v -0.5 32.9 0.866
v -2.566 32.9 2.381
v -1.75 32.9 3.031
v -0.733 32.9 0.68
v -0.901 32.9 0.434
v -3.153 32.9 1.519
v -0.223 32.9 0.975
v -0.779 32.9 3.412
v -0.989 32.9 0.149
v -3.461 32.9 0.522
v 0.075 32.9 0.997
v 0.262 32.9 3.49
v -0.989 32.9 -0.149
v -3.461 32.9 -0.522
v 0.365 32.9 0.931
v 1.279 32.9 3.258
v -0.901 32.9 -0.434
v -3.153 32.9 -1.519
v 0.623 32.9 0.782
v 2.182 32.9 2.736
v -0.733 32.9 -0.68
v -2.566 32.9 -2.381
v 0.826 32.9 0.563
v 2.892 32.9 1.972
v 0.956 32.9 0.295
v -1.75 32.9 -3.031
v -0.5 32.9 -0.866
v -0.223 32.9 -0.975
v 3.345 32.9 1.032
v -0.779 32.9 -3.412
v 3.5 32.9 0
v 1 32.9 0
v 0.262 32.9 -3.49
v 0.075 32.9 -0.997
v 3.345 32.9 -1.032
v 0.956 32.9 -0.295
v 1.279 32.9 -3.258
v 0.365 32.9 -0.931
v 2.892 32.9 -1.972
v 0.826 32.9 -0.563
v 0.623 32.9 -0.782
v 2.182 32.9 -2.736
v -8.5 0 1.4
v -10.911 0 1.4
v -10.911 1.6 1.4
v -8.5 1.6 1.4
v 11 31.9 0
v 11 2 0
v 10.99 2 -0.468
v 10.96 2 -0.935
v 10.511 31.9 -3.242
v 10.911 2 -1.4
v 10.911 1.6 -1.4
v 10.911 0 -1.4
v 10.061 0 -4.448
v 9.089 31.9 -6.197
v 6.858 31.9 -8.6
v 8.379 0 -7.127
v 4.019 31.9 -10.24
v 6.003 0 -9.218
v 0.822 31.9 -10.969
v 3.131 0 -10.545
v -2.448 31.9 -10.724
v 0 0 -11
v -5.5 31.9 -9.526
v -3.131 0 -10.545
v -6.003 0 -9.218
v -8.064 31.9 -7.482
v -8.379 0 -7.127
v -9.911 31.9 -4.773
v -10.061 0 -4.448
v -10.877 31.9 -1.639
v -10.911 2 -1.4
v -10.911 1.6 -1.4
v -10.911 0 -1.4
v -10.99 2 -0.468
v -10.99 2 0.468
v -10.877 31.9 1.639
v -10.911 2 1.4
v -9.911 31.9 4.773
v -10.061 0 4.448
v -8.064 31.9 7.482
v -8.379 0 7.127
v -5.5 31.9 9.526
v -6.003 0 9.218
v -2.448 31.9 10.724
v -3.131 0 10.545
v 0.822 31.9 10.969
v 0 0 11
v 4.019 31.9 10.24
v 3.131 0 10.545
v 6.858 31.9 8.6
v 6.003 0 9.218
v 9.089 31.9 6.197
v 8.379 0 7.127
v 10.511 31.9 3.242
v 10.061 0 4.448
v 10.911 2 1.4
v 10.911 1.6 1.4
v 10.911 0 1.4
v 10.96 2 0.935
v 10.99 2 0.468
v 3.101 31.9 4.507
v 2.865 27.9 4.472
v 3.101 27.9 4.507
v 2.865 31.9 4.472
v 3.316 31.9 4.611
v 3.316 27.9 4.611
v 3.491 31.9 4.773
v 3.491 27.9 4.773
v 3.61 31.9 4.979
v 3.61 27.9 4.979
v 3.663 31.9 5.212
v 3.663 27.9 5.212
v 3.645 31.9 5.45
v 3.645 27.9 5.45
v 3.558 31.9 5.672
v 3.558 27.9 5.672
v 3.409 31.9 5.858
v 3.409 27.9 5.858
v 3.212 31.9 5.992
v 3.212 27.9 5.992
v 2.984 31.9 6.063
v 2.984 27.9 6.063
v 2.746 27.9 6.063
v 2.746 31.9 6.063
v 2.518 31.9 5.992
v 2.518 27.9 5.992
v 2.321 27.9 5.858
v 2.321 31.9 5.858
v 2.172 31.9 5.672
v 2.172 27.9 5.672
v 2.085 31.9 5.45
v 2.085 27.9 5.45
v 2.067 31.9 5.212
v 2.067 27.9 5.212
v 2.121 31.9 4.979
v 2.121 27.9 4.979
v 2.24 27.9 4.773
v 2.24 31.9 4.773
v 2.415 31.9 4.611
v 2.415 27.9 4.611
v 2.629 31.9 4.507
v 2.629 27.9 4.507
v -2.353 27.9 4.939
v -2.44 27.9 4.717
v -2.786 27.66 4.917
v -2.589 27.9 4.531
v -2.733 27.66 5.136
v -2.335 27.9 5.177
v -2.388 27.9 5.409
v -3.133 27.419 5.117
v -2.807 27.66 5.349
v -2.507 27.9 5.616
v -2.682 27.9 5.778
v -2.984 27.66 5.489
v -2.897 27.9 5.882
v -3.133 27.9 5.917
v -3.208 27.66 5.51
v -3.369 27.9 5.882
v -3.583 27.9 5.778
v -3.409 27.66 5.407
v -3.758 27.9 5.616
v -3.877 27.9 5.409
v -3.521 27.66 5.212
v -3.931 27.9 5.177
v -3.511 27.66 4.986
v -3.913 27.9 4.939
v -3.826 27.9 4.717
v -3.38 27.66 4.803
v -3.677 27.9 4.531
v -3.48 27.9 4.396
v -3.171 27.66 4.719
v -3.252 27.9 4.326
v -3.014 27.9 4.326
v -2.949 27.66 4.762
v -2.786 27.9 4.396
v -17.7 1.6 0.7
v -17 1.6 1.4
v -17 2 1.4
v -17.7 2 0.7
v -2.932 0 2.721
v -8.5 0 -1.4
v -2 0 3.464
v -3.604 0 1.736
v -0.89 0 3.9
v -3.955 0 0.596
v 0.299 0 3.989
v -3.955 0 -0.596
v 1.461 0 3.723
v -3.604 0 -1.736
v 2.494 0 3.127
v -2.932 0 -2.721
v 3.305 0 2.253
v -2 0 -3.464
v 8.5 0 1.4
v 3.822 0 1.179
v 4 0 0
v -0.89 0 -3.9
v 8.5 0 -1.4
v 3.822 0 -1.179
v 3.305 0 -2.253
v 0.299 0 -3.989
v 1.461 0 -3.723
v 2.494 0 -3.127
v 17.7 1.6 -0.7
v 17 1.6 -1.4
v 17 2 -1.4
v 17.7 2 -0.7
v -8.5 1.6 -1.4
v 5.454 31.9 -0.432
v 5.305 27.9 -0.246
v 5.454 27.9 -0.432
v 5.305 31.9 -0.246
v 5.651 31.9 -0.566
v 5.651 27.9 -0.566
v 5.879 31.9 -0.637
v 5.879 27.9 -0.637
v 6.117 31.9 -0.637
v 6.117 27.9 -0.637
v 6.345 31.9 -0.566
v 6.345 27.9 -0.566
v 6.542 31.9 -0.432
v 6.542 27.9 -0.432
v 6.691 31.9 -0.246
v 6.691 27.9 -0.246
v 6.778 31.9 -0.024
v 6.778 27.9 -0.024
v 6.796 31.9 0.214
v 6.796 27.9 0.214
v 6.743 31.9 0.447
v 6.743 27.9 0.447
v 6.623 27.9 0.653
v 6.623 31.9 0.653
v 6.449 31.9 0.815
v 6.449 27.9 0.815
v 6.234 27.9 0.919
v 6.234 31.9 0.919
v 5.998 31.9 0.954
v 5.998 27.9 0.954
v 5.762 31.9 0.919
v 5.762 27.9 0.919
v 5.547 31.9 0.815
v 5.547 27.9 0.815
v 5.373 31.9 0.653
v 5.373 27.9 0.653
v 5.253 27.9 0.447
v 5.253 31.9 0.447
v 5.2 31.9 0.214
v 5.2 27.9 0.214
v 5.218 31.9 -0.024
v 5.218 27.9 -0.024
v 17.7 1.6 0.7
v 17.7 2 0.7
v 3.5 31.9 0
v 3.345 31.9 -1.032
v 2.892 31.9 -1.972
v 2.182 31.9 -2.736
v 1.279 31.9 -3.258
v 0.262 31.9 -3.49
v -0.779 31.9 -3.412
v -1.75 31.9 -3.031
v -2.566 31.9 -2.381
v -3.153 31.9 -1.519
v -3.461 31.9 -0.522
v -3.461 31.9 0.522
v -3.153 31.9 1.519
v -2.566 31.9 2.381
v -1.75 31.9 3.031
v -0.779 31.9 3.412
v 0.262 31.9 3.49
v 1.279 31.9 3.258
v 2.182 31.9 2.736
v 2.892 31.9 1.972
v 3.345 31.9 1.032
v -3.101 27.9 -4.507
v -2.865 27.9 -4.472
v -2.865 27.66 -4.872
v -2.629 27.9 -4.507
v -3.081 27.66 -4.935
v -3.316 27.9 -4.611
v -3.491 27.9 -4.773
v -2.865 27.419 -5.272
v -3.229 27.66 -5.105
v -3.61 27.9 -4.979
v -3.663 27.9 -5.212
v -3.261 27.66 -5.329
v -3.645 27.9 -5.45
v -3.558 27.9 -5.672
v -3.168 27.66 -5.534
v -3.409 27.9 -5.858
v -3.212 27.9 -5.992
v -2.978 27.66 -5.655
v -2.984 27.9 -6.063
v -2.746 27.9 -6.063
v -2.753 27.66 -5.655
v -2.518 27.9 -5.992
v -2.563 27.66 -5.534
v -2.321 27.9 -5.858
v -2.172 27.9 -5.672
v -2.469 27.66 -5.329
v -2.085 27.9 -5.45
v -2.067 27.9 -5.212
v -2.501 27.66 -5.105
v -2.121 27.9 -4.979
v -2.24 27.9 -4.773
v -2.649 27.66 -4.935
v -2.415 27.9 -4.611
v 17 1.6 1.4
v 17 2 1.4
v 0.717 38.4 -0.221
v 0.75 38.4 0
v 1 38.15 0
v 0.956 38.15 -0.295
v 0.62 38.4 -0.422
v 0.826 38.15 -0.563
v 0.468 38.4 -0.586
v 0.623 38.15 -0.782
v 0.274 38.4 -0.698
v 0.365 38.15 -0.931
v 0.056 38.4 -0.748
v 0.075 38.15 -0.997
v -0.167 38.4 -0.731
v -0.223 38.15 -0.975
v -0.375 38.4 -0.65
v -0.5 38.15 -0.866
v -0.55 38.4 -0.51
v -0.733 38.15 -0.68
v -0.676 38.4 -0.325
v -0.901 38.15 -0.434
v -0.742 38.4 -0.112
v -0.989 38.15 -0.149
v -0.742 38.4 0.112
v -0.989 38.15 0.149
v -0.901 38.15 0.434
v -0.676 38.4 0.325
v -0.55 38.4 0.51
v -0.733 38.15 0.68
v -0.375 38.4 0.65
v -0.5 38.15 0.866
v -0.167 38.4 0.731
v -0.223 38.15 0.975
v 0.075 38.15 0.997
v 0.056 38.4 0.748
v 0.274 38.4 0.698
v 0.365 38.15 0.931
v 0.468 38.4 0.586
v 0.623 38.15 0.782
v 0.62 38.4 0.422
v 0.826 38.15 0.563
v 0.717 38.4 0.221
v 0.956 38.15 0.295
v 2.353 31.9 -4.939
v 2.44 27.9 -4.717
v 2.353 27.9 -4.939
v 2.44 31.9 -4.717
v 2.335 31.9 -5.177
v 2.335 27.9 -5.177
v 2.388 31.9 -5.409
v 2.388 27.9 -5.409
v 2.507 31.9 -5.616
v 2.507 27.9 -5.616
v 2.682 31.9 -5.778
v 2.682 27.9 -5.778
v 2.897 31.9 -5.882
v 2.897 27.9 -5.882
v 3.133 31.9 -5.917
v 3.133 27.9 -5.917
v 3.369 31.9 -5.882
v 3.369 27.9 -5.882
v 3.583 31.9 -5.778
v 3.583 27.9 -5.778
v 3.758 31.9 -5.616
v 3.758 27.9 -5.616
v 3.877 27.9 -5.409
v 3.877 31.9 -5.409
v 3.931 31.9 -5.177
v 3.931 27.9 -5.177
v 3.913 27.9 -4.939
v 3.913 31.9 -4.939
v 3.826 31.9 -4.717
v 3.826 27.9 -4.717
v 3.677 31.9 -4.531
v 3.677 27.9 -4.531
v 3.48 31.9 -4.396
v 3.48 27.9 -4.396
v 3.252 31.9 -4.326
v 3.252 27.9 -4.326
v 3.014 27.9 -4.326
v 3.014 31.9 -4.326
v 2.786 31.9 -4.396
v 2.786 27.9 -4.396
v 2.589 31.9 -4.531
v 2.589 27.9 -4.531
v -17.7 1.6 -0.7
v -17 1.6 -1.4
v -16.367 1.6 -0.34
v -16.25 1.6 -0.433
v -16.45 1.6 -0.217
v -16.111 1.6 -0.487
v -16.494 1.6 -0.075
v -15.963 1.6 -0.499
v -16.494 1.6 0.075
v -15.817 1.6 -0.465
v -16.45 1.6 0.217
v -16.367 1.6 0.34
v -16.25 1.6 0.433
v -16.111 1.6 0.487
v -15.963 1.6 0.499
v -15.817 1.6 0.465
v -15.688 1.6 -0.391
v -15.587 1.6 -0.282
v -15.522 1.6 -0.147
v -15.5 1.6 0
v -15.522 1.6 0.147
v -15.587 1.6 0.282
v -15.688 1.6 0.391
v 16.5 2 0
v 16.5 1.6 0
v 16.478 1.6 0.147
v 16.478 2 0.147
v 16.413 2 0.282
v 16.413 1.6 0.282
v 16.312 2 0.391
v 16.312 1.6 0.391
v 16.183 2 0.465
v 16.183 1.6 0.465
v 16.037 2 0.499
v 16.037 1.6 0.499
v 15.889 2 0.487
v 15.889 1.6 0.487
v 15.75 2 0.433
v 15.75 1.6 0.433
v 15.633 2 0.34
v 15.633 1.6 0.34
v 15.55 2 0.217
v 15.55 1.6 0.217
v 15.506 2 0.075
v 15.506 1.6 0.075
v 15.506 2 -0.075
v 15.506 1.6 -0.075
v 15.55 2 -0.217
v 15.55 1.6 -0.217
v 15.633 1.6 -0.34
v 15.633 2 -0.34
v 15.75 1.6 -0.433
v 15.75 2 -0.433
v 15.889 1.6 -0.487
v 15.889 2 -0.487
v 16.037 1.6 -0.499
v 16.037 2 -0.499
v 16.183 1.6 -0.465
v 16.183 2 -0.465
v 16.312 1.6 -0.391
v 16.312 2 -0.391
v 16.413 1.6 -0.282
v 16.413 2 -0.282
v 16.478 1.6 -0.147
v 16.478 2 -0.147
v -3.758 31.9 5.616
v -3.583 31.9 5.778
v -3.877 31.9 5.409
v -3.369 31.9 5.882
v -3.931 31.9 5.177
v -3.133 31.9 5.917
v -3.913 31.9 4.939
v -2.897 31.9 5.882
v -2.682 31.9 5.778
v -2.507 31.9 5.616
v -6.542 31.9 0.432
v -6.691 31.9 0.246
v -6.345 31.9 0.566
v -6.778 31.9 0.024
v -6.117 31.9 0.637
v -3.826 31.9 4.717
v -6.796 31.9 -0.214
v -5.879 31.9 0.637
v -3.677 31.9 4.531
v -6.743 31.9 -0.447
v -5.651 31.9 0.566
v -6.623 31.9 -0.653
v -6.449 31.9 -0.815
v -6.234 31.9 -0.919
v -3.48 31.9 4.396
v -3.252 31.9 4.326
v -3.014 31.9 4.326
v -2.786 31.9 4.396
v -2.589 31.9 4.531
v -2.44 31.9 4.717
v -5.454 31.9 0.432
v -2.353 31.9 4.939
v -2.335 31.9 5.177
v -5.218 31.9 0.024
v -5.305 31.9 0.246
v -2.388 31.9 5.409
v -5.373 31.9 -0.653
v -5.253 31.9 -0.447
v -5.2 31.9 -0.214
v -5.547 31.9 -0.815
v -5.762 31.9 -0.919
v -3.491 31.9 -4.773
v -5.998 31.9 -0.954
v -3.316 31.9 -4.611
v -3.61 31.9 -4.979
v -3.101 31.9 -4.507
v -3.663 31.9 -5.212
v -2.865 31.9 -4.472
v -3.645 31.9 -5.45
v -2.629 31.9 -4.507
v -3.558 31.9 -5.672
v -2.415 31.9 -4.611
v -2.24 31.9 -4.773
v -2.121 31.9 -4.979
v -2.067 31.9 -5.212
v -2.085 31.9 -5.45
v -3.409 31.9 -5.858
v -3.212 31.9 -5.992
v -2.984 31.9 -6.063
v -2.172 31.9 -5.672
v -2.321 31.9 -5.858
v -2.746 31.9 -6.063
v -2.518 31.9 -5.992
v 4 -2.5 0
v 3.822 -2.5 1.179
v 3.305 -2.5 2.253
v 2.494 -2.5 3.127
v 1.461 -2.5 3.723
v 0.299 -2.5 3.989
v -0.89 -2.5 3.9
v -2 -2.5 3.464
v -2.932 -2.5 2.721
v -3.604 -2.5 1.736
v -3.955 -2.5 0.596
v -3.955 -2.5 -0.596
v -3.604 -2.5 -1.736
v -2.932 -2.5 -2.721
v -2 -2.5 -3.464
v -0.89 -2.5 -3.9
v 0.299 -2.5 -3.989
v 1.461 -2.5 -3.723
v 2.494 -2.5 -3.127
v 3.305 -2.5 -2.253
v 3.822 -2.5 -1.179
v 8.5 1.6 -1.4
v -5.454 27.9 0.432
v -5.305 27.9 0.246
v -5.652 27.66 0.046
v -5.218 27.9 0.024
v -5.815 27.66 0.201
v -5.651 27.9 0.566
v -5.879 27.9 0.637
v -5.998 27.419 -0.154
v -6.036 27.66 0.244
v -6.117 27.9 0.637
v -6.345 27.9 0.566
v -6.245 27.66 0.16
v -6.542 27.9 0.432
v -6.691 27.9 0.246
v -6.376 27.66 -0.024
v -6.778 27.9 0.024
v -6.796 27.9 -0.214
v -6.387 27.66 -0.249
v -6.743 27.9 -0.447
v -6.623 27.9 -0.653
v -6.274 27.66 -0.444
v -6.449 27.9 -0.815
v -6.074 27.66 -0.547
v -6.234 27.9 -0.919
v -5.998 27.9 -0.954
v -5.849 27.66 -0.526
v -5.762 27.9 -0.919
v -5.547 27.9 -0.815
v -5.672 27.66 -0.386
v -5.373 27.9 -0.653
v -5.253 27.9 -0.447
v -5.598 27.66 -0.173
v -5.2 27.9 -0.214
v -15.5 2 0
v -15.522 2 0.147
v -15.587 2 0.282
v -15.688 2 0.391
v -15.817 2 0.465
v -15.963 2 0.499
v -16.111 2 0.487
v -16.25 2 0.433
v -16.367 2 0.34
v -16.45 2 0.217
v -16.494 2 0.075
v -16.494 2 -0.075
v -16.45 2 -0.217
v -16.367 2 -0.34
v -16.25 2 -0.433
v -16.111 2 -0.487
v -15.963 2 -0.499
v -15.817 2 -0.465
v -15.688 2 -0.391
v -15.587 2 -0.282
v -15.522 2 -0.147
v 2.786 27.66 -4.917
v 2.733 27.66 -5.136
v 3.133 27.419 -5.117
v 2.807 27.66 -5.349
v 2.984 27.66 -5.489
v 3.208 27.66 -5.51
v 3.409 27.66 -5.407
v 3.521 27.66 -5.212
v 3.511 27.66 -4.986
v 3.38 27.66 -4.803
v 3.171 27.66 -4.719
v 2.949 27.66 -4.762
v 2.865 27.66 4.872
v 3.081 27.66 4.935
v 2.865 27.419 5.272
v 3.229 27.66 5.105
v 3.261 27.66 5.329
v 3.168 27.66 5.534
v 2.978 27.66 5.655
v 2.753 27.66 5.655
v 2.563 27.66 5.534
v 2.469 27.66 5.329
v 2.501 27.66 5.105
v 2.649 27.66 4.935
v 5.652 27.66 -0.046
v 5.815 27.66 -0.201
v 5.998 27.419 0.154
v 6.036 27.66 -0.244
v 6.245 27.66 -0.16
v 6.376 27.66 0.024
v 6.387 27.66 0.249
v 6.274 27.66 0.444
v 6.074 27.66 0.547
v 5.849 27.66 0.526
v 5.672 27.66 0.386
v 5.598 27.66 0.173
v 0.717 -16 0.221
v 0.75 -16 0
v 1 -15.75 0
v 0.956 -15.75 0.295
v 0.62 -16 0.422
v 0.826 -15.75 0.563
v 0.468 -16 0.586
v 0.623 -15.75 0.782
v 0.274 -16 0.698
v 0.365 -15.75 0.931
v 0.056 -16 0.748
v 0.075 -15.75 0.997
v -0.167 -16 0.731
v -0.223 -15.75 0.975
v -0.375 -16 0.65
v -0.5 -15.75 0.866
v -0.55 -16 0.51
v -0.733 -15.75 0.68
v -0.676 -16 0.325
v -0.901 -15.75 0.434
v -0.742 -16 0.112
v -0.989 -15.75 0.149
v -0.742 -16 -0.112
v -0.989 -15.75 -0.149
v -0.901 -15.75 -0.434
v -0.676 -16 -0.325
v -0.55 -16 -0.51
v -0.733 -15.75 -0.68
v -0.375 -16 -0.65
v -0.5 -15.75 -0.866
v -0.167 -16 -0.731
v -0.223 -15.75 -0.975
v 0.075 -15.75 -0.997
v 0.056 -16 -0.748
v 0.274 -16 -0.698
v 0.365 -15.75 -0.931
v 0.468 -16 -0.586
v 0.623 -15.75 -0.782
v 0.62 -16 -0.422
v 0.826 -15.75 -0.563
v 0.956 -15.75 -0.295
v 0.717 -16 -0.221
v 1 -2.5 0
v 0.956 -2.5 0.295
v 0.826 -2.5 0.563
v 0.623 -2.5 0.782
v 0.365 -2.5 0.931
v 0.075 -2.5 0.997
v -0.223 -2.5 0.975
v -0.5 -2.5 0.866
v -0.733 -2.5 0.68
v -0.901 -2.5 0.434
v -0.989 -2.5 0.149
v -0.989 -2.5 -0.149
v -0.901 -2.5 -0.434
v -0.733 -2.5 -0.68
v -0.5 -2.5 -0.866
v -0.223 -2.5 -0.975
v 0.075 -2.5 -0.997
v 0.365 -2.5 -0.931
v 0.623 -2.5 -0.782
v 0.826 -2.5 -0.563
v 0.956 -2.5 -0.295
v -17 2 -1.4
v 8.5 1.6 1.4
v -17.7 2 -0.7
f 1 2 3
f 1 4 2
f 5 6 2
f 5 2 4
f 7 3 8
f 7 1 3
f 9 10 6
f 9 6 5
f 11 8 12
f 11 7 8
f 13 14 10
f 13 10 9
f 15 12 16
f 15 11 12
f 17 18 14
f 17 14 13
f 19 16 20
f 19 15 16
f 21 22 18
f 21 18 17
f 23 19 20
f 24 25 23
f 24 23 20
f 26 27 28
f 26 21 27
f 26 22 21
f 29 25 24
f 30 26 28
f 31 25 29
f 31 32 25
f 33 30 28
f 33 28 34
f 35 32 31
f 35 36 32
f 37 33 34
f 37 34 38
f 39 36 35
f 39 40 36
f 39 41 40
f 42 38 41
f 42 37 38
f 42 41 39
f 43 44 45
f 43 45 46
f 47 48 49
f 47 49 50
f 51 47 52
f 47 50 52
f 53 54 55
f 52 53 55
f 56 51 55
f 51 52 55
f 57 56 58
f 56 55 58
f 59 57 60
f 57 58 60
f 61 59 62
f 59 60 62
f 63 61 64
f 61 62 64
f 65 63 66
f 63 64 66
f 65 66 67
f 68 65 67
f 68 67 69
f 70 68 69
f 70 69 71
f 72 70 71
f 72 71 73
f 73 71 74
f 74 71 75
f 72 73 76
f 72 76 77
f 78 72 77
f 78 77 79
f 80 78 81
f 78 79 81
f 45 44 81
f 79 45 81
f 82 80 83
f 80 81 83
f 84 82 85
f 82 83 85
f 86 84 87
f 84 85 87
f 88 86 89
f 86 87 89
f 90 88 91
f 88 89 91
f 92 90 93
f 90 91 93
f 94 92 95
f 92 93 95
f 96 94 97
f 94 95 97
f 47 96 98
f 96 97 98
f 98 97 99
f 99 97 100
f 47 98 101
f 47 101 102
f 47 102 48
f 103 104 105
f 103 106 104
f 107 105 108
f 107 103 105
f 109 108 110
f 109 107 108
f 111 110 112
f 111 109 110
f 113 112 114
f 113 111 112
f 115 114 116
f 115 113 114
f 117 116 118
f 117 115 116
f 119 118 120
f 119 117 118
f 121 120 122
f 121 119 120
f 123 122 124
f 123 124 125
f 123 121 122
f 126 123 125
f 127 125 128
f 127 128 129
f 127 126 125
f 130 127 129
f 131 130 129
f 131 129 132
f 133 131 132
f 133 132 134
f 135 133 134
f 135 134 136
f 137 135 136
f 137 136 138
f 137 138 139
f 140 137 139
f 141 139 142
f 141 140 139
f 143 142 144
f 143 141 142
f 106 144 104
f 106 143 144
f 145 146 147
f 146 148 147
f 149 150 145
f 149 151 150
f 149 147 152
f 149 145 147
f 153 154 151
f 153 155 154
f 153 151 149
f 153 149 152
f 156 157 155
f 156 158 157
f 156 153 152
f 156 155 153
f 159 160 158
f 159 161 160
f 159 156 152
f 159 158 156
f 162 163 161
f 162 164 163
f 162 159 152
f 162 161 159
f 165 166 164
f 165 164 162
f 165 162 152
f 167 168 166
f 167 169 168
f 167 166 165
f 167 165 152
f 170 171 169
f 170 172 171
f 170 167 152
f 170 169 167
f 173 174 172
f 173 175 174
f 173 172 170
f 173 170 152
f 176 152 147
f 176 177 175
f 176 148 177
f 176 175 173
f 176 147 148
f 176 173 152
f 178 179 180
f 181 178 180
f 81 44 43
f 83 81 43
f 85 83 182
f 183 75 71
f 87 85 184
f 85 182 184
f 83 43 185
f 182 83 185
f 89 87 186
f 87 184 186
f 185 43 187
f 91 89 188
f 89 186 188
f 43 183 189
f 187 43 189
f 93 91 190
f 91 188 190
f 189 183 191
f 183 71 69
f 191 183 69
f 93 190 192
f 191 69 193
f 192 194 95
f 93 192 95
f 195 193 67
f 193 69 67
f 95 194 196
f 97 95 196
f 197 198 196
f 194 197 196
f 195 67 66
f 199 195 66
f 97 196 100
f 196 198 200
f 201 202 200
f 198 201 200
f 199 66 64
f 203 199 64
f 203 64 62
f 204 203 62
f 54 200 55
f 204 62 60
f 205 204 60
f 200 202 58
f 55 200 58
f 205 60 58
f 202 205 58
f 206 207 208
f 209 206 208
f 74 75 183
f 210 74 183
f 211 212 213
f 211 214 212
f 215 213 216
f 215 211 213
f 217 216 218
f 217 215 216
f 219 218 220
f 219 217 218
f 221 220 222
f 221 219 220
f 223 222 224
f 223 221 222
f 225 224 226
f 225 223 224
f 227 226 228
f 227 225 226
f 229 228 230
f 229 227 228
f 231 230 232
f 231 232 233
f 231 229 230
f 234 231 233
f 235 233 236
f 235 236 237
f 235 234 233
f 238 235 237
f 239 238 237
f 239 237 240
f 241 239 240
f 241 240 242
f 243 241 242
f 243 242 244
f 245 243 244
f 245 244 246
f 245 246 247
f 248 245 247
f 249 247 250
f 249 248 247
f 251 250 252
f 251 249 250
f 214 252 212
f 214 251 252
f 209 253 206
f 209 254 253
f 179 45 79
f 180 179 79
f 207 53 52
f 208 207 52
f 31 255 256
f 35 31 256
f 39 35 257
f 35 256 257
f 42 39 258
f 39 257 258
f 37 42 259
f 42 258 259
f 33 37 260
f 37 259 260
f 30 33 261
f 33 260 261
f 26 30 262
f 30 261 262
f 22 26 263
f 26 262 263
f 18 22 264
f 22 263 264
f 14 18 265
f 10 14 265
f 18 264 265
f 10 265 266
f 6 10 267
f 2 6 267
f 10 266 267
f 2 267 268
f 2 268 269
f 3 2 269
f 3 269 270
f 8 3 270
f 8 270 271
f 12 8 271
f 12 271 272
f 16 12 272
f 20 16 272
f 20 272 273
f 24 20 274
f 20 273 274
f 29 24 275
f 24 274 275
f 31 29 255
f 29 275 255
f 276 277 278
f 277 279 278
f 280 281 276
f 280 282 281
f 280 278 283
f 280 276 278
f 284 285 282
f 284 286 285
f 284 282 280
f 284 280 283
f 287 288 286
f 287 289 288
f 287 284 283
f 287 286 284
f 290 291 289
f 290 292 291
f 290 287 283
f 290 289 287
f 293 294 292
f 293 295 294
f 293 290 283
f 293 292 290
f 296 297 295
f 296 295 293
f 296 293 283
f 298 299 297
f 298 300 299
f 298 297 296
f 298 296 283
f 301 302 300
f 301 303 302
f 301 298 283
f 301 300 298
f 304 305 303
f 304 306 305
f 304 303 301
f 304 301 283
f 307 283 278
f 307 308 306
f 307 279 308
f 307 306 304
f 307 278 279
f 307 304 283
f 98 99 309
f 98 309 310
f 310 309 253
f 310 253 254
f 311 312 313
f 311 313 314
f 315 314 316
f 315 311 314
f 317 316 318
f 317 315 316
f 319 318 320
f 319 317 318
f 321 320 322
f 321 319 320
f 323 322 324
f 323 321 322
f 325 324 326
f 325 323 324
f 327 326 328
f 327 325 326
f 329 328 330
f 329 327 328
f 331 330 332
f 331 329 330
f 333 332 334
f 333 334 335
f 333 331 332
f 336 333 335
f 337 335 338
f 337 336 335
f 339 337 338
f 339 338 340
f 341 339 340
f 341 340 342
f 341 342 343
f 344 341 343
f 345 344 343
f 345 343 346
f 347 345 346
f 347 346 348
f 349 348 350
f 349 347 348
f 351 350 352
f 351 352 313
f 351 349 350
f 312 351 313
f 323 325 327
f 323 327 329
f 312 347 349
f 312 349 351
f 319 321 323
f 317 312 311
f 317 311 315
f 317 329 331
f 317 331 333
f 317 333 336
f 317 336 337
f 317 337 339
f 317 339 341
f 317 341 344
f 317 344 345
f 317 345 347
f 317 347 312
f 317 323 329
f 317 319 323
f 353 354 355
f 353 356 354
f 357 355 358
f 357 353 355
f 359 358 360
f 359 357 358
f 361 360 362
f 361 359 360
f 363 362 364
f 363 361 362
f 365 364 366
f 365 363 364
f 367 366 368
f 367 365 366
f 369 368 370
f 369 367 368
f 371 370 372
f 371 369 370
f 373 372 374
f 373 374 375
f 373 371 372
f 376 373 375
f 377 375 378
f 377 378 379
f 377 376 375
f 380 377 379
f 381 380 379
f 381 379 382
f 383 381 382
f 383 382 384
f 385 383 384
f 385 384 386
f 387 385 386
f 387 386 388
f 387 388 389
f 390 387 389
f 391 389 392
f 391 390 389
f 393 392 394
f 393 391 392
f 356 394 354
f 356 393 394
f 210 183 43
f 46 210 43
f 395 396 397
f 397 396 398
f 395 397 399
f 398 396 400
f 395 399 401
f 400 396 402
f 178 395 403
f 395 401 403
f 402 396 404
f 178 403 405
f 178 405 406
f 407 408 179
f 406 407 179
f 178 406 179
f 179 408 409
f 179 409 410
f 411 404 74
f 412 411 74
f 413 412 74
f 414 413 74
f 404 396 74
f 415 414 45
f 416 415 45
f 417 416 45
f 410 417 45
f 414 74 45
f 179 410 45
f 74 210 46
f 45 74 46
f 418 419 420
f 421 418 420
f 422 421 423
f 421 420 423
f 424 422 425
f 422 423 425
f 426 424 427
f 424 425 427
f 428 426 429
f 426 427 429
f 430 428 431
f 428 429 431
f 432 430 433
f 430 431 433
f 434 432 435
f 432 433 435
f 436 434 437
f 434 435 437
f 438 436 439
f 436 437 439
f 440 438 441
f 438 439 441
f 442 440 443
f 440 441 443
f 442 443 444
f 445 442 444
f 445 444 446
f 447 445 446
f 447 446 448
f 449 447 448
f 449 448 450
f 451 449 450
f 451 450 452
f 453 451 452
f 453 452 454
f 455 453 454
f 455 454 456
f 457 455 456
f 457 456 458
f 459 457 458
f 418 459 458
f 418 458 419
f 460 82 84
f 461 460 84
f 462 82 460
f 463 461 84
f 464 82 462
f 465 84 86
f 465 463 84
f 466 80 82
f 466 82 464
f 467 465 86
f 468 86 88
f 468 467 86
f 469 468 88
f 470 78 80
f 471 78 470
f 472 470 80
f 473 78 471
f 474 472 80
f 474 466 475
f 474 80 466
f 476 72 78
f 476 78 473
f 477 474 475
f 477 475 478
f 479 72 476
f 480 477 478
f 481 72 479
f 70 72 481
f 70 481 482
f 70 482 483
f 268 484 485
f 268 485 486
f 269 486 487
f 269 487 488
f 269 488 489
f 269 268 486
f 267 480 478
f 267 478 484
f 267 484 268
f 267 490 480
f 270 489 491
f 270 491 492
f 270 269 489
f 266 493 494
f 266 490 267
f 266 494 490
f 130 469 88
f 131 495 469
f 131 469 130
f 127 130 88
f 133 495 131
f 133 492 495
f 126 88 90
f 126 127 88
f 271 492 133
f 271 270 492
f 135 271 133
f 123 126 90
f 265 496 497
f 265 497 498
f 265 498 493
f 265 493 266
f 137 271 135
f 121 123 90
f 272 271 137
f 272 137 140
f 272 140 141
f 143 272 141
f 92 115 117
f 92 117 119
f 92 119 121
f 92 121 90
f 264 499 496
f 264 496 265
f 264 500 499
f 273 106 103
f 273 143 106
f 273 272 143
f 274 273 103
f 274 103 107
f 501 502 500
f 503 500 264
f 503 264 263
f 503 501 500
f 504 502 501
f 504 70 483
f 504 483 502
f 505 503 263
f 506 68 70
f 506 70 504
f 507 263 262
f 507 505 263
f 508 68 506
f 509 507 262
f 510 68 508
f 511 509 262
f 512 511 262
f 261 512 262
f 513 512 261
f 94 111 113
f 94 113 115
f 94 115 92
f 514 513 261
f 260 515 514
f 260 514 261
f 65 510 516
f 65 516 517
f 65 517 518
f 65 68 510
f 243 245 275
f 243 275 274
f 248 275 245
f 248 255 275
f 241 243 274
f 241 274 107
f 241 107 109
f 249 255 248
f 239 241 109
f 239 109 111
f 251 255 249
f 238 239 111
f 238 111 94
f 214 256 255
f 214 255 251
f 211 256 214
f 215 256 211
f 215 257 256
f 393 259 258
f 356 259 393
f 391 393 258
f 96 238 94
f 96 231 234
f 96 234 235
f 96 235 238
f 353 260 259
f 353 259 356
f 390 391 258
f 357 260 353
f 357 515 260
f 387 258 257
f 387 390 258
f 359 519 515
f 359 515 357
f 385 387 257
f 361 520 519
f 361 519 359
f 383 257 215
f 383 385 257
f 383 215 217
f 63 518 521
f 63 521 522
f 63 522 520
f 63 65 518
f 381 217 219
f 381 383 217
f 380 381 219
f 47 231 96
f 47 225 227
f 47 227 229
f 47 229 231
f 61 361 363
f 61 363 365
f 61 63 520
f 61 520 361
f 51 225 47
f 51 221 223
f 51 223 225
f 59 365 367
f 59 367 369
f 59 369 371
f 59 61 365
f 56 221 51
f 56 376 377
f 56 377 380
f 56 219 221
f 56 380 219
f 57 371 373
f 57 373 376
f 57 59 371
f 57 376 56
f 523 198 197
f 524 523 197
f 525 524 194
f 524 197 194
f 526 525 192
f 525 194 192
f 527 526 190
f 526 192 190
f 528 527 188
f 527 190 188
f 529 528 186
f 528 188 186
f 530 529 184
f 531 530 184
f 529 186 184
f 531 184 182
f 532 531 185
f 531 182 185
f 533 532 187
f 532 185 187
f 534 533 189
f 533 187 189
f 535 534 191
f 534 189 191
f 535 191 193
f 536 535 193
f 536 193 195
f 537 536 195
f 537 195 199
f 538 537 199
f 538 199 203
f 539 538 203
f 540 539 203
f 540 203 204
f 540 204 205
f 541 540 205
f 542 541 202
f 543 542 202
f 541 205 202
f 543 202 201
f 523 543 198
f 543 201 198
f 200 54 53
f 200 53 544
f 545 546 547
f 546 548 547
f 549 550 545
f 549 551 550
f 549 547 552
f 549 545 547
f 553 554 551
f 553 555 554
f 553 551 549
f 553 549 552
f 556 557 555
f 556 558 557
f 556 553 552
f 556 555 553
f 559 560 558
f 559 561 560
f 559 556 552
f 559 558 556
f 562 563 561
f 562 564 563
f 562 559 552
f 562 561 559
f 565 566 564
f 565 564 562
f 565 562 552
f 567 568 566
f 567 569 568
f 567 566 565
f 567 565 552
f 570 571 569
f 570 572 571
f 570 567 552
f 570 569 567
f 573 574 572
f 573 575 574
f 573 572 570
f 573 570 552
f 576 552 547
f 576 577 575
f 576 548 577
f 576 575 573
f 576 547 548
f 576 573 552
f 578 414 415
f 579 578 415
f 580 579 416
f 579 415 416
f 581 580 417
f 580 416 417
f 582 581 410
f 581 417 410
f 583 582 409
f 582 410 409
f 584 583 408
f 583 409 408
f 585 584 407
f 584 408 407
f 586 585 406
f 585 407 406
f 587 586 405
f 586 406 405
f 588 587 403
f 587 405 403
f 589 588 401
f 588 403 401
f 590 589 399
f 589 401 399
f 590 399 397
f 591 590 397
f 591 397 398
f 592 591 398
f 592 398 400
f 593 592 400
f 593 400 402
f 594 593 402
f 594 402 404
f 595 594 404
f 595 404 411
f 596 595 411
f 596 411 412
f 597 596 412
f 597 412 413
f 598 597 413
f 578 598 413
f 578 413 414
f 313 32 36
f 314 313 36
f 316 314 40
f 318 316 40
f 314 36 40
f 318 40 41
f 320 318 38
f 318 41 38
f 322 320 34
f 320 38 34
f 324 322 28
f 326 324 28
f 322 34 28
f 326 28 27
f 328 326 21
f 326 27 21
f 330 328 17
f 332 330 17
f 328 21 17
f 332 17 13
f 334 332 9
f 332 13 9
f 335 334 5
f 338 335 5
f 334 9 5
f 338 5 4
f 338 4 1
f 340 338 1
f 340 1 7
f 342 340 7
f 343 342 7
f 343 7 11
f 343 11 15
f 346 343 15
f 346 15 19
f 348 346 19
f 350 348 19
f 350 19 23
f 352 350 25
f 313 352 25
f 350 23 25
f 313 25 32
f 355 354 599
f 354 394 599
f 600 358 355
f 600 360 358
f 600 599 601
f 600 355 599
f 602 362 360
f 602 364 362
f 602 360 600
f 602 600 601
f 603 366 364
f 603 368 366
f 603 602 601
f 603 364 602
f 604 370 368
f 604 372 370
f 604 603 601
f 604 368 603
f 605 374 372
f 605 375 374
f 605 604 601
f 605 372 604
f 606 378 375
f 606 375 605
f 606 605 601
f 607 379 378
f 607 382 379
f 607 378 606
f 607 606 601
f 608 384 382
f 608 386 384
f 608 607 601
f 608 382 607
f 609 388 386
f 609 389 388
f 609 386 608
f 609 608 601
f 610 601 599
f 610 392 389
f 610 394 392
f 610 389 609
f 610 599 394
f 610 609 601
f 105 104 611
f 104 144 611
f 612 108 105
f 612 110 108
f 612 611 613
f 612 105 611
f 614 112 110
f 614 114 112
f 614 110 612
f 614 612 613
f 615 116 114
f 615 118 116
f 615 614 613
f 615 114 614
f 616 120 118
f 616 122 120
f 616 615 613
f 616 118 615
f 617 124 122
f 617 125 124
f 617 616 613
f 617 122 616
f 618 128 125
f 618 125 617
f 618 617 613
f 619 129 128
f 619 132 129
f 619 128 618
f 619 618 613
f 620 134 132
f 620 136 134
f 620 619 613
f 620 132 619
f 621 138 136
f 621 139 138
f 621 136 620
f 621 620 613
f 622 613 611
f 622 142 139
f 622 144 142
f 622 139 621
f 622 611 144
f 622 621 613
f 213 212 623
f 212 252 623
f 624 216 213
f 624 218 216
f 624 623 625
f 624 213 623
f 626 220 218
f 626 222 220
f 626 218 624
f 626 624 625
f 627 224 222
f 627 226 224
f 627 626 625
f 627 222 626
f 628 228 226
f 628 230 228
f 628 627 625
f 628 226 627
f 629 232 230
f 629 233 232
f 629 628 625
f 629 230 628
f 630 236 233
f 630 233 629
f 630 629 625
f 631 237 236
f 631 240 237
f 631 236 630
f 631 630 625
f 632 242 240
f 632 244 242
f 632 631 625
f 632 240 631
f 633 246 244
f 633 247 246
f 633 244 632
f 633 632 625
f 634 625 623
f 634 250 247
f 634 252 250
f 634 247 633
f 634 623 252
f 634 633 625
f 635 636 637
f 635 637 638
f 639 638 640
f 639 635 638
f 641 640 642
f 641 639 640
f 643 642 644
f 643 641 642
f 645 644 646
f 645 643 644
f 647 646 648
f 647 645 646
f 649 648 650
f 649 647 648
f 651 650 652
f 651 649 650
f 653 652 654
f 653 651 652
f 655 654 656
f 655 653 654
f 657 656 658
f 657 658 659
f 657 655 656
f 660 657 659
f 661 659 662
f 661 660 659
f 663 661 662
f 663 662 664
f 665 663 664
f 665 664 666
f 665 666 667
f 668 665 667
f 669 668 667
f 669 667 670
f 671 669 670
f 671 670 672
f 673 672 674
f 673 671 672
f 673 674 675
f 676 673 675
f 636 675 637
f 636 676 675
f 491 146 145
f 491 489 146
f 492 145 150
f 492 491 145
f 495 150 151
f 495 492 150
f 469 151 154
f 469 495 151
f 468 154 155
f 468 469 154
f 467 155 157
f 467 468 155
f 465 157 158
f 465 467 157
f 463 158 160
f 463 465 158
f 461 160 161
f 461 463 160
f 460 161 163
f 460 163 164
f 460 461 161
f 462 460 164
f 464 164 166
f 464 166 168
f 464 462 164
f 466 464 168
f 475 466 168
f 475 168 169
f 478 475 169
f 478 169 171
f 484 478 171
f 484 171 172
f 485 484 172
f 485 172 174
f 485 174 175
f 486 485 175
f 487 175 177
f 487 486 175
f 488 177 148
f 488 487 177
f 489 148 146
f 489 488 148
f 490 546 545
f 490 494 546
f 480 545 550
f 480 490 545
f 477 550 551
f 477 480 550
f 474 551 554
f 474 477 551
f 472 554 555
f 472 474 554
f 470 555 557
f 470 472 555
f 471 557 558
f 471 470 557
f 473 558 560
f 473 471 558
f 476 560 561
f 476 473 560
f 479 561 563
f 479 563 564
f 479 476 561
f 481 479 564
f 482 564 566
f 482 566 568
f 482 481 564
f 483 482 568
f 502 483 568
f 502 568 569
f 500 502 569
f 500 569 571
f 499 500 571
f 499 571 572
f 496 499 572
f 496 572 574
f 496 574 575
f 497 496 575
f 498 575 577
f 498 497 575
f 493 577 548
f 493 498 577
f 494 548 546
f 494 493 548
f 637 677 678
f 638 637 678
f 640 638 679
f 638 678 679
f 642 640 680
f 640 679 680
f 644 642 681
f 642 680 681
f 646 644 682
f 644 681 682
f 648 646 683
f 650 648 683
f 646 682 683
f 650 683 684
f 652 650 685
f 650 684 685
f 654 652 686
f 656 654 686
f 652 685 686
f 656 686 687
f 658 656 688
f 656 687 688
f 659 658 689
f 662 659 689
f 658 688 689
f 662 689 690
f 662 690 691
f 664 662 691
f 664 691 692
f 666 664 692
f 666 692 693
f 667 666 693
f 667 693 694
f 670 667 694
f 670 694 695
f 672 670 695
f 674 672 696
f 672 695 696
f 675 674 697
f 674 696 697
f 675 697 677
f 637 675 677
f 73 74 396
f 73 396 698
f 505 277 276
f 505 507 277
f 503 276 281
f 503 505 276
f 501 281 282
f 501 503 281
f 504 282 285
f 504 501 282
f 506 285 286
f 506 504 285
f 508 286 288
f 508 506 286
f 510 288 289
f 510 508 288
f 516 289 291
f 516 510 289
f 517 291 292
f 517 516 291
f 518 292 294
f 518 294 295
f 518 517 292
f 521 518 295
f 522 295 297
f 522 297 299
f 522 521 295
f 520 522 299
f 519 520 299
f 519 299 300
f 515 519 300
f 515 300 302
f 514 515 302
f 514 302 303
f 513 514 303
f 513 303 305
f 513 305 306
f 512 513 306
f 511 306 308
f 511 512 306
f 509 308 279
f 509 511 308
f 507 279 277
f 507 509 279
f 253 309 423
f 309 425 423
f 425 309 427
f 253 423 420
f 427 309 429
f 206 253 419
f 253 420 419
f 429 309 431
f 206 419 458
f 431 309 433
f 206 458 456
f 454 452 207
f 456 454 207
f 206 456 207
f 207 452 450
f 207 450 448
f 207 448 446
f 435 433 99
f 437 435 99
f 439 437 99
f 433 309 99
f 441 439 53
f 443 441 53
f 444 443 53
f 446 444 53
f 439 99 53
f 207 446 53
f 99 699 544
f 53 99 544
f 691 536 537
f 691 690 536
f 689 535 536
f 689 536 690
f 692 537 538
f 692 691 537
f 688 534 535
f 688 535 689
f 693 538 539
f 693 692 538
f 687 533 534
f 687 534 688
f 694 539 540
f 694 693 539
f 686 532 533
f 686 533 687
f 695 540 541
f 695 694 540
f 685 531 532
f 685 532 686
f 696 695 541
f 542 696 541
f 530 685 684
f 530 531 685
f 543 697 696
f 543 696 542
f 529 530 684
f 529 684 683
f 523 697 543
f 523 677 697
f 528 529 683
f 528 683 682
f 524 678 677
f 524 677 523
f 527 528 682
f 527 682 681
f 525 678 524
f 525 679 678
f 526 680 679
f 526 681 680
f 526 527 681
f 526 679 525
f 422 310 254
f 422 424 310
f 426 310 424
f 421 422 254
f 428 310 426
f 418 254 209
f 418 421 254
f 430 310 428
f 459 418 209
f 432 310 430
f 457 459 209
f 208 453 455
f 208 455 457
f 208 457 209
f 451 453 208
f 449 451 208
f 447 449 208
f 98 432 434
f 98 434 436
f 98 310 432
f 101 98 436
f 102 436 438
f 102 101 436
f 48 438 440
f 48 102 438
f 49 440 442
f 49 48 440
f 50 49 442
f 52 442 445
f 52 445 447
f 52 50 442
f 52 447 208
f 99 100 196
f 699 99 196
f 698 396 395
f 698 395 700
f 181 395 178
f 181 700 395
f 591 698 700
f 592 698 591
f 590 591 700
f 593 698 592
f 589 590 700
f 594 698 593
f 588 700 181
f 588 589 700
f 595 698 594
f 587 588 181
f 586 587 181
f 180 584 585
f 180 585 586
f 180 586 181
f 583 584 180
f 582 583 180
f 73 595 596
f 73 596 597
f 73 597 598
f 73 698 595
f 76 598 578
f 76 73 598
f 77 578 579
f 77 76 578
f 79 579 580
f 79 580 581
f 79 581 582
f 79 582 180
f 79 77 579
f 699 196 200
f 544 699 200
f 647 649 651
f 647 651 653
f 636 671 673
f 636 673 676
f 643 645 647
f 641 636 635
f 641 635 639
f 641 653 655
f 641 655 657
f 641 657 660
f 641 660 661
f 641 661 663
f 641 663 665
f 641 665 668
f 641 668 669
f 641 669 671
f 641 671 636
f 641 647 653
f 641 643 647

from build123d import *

# Parameters (mm, degrees)
ESQUISSE1_R                  = 11
EXTRUSION1_DEPTH             = 31.9
ESQUISSE2_R                  = 3.5
EXTRUSION2_DEPTH             = 1
ESQUISSE3_R                  = 1
EXTRUSION3_DEPTH             = 5.5
CHANFREIN1_SIZE              = 0.25
ESQUISSE4_R                  = 4
EXTRUSION4_DEPTH             = 2.5
ESQUISSE5_R                  = 1
EXTRUSION5_DEPTH             = 13.5
R_P_TITION_CIRCULAIRE1_COUNT = 6
CHANFREIN2_SIZE              = 0.25
ESQUISSE14_W                 = 3.416971917
ESQUISSE14_H                 = 2.8
ENL_V_MAT_EXTRU_5_DEPTH      = 2
R_P_TITION_CIRCULAIRE2_COUNT = 2
ESQUISSE16_W                 = 2.8
ESQUISSE16_H                 = 0.4
EXTRUSION7_DEPTH             = 9.2
ESQUISSE17_W                 = 2.8
ESQUISSE17_H                 = 0.4
EXTRUSION8_DEPTH             = 9.2
CHANFREIN3_SIZE              = 0.7
CHANFREIN4_SIZE              = 0.7
ESQUISSE18_R                 = 0.5
ENL_V_MAT_EXTRU_6_DEPTH      = 37.8
ESQUISSE19_R                 = 0.5
ENL_V_MAT_EXTRU_7_DEPTH      = 37.8


with BuildPart() as part:
    # Esquisse1 → Extrusion1 (new body)
    with BuildSketch(Plane(origin=(0, 0, 0), x_dir=(1, 0, 0), z_dir=(0, 1, 0))):
        Circle(ESQUISSE1_R)
    extrude(amount=EXTRUSION1_DEPTH)

    # Esquisse2 → Extrusion2 (add)
    with BuildSketch(Plane(origin=(0, 31.9, 0), x_dir=(1, 0, 0), z_dir=(0, 1, 0))):
        Circle(ESQUISSE2_R)
    extrude(amount=EXTRUSION2_DEPTH)

    # Esquisse3 → Extrusion3 (add)
    with BuildSketch(Plane(origin=(0, 32.9, 0), x_dir=(1, 0, 0), z_dir=(0, 1, 0))):
        Circle(ESQUISSE3_R)
    extrude(amount=EXTRUSION3_DEPTH)

    # Chanfrein1
    chanfrein1_edges = [part.edges().sort_by_distance(p)[0] for p in [
        (-1, 38.4, 0),
    ]]
    chamfer(chanfrein1_edges, length=CHANFREIN1_SIZE)

    # Esquisse4 → Extrusion4 (add)
    with BuildSketch(Plane.XZ):
        Circle(ESQUISSE4_R)
    extrude(amount=EXTRUSION4_DEPTH)

    # Esquisse5 → Extrusion5 (add)
    with BuildSketch(Plane.XZ.offset(2.5)):
        Circle(ESQUISSE5_R)
    extrude(amount=EXTRUSION5_DEPTH)

    # Esquisse7 → Trou taraudé M2x0.41 (revolve, cut)
    with BuildSketch(Plane(origin=(-2.865237062, 31.9, -5.271661653), x_dir=(0, 0, 1), z_dir=(1, 0, 0))):
        Polygon((0, 0), (0, 4.480688495), (0.8, 4), (0.8, 0), align=None)
    trou_taraud_m2x0_41 = revolve(axis=Axis((-2.865237062, 38.25, -5.271661653), (0, -1, 0)), mode=Mode.SUBTRACT)

    # Répétition circulaire1: Trou taraudé M2x0.41 ×6 about axis
    r_p_tition_circulaire1_axis = Axis((0, 0, 0), (0, 1, 0))
    for i in range(1, R_P_TITION_CIRCULAIRE1_COUNT):
        add(trou_taraud_m2x0_41.rotate(r_p_tition_circulaire1_axis, i * 360 / R_P_TITION_CIRCULAIRE1_COUNT), mode=Mode.SUBTRACT)

    # Chanfrein2
    chanfrein2_edges = [part.edges().sort_by_distance(p)[0] for p in [
        (-1, -16, 0),
    ]]
    chamfer(chanfrein2_edges, length=CHANFREIN2_SIZE)

    # Esquisse14 → Enlèv. mat.-Extru.5 (cut)
    with BuildSketch(Plane.XZ):
        with Locations((-10.208485959, 0)):
            Rectangle(ESQUISSE14_W, ESQUISSE14_H)
    enl_v_mat_extru_5 = extrude(amount=-ENL_V_MAT_EXTRU_5_DEPTH, mode=Mode.SUBTRACT)

    # Répétition circulaire2: Enlèv. mat.-Extru.5 ×2 about axis
    r_p_tition_circulaire2_axis = Axis((0, 0, 0), (0, 1, 0))
    for i in range(1, R_P_TITION_CIRCULAIRE2_COUNT):
        add(enl_v_mat_extru_5.rotate(r_p_tition_circulaire2_axis, i * 360 / R_P_TITION_CIRCULAIRE2_COUNT), mode=Mode.SUBTRACT)

    # Esquisse16 → Extrusion7 (add)
    with BuildSketch(Plane(origin=(8.5, 0, 0), x_dir=(0, 0, -1), z_dir=(1, 0, 0))):
        with Locations((0, 1.8)):
            Rectangle(ESQUISSE16_W, ESQUISSE16_H)
    extrude(amount=EXTRUSION7_DEPTH)

    # Esquisse17 → Extrusion8 (add)
    with BuildSketch(Plane.ZY.offset(8.5)):
        with Locations((0, 1.8)):
            Rectangle(ESQUISSE17_W, ESQUISSE17_H)
    extrude(amount=EXTRUSION8_DEPTH)

    # Chanfrein3
    chanfrein3_edges = [part.edges().sort_by_distance(p)[0] for p in [
        (17.7, 1.8, 1.4),
        (17.7, 1.8, -1.4),
    ]]
    chamfer(chanfrein3_edges, length=CHANFREIN3_SIZE)

    # Chanfrein4
    chanfrein4_edges = [part.edges().sort_by_distance(p)[0] for p in [
        (-17.7, 1.8, -1.4),
        (-17.7, 1.8, 1.4),
    ]]
    chamfer(chanfrein4_edges, length=CHANFREIN4_SIZE)

    # Esquisse18 → Enlèv. mat.-Extru.6 (cut, through all)
    with BuildSketch(Plane.XZ.offset(-1.6)):
        with Locations((-16, 0)):
            Circle(ESQUISSE18_R)
    extrude(amount=-ENL_V_MAT_EXTRU_6_DEPTH, mode=Mode.SUBTRACT)

    # Esquisse19 → Enlèv. mat.-Extru.7 (cut, through all)
    with BuildSketch(Plane.XZ.offset(-1.6)):
        with Locations((16, 0)):
            Circle(ESQUISSE19_R)
    extrude(amount=-ENL_V_MAT_EXTRU_7_DEPTH, mode=Mode.SUBTRACT)


solid = part.part
